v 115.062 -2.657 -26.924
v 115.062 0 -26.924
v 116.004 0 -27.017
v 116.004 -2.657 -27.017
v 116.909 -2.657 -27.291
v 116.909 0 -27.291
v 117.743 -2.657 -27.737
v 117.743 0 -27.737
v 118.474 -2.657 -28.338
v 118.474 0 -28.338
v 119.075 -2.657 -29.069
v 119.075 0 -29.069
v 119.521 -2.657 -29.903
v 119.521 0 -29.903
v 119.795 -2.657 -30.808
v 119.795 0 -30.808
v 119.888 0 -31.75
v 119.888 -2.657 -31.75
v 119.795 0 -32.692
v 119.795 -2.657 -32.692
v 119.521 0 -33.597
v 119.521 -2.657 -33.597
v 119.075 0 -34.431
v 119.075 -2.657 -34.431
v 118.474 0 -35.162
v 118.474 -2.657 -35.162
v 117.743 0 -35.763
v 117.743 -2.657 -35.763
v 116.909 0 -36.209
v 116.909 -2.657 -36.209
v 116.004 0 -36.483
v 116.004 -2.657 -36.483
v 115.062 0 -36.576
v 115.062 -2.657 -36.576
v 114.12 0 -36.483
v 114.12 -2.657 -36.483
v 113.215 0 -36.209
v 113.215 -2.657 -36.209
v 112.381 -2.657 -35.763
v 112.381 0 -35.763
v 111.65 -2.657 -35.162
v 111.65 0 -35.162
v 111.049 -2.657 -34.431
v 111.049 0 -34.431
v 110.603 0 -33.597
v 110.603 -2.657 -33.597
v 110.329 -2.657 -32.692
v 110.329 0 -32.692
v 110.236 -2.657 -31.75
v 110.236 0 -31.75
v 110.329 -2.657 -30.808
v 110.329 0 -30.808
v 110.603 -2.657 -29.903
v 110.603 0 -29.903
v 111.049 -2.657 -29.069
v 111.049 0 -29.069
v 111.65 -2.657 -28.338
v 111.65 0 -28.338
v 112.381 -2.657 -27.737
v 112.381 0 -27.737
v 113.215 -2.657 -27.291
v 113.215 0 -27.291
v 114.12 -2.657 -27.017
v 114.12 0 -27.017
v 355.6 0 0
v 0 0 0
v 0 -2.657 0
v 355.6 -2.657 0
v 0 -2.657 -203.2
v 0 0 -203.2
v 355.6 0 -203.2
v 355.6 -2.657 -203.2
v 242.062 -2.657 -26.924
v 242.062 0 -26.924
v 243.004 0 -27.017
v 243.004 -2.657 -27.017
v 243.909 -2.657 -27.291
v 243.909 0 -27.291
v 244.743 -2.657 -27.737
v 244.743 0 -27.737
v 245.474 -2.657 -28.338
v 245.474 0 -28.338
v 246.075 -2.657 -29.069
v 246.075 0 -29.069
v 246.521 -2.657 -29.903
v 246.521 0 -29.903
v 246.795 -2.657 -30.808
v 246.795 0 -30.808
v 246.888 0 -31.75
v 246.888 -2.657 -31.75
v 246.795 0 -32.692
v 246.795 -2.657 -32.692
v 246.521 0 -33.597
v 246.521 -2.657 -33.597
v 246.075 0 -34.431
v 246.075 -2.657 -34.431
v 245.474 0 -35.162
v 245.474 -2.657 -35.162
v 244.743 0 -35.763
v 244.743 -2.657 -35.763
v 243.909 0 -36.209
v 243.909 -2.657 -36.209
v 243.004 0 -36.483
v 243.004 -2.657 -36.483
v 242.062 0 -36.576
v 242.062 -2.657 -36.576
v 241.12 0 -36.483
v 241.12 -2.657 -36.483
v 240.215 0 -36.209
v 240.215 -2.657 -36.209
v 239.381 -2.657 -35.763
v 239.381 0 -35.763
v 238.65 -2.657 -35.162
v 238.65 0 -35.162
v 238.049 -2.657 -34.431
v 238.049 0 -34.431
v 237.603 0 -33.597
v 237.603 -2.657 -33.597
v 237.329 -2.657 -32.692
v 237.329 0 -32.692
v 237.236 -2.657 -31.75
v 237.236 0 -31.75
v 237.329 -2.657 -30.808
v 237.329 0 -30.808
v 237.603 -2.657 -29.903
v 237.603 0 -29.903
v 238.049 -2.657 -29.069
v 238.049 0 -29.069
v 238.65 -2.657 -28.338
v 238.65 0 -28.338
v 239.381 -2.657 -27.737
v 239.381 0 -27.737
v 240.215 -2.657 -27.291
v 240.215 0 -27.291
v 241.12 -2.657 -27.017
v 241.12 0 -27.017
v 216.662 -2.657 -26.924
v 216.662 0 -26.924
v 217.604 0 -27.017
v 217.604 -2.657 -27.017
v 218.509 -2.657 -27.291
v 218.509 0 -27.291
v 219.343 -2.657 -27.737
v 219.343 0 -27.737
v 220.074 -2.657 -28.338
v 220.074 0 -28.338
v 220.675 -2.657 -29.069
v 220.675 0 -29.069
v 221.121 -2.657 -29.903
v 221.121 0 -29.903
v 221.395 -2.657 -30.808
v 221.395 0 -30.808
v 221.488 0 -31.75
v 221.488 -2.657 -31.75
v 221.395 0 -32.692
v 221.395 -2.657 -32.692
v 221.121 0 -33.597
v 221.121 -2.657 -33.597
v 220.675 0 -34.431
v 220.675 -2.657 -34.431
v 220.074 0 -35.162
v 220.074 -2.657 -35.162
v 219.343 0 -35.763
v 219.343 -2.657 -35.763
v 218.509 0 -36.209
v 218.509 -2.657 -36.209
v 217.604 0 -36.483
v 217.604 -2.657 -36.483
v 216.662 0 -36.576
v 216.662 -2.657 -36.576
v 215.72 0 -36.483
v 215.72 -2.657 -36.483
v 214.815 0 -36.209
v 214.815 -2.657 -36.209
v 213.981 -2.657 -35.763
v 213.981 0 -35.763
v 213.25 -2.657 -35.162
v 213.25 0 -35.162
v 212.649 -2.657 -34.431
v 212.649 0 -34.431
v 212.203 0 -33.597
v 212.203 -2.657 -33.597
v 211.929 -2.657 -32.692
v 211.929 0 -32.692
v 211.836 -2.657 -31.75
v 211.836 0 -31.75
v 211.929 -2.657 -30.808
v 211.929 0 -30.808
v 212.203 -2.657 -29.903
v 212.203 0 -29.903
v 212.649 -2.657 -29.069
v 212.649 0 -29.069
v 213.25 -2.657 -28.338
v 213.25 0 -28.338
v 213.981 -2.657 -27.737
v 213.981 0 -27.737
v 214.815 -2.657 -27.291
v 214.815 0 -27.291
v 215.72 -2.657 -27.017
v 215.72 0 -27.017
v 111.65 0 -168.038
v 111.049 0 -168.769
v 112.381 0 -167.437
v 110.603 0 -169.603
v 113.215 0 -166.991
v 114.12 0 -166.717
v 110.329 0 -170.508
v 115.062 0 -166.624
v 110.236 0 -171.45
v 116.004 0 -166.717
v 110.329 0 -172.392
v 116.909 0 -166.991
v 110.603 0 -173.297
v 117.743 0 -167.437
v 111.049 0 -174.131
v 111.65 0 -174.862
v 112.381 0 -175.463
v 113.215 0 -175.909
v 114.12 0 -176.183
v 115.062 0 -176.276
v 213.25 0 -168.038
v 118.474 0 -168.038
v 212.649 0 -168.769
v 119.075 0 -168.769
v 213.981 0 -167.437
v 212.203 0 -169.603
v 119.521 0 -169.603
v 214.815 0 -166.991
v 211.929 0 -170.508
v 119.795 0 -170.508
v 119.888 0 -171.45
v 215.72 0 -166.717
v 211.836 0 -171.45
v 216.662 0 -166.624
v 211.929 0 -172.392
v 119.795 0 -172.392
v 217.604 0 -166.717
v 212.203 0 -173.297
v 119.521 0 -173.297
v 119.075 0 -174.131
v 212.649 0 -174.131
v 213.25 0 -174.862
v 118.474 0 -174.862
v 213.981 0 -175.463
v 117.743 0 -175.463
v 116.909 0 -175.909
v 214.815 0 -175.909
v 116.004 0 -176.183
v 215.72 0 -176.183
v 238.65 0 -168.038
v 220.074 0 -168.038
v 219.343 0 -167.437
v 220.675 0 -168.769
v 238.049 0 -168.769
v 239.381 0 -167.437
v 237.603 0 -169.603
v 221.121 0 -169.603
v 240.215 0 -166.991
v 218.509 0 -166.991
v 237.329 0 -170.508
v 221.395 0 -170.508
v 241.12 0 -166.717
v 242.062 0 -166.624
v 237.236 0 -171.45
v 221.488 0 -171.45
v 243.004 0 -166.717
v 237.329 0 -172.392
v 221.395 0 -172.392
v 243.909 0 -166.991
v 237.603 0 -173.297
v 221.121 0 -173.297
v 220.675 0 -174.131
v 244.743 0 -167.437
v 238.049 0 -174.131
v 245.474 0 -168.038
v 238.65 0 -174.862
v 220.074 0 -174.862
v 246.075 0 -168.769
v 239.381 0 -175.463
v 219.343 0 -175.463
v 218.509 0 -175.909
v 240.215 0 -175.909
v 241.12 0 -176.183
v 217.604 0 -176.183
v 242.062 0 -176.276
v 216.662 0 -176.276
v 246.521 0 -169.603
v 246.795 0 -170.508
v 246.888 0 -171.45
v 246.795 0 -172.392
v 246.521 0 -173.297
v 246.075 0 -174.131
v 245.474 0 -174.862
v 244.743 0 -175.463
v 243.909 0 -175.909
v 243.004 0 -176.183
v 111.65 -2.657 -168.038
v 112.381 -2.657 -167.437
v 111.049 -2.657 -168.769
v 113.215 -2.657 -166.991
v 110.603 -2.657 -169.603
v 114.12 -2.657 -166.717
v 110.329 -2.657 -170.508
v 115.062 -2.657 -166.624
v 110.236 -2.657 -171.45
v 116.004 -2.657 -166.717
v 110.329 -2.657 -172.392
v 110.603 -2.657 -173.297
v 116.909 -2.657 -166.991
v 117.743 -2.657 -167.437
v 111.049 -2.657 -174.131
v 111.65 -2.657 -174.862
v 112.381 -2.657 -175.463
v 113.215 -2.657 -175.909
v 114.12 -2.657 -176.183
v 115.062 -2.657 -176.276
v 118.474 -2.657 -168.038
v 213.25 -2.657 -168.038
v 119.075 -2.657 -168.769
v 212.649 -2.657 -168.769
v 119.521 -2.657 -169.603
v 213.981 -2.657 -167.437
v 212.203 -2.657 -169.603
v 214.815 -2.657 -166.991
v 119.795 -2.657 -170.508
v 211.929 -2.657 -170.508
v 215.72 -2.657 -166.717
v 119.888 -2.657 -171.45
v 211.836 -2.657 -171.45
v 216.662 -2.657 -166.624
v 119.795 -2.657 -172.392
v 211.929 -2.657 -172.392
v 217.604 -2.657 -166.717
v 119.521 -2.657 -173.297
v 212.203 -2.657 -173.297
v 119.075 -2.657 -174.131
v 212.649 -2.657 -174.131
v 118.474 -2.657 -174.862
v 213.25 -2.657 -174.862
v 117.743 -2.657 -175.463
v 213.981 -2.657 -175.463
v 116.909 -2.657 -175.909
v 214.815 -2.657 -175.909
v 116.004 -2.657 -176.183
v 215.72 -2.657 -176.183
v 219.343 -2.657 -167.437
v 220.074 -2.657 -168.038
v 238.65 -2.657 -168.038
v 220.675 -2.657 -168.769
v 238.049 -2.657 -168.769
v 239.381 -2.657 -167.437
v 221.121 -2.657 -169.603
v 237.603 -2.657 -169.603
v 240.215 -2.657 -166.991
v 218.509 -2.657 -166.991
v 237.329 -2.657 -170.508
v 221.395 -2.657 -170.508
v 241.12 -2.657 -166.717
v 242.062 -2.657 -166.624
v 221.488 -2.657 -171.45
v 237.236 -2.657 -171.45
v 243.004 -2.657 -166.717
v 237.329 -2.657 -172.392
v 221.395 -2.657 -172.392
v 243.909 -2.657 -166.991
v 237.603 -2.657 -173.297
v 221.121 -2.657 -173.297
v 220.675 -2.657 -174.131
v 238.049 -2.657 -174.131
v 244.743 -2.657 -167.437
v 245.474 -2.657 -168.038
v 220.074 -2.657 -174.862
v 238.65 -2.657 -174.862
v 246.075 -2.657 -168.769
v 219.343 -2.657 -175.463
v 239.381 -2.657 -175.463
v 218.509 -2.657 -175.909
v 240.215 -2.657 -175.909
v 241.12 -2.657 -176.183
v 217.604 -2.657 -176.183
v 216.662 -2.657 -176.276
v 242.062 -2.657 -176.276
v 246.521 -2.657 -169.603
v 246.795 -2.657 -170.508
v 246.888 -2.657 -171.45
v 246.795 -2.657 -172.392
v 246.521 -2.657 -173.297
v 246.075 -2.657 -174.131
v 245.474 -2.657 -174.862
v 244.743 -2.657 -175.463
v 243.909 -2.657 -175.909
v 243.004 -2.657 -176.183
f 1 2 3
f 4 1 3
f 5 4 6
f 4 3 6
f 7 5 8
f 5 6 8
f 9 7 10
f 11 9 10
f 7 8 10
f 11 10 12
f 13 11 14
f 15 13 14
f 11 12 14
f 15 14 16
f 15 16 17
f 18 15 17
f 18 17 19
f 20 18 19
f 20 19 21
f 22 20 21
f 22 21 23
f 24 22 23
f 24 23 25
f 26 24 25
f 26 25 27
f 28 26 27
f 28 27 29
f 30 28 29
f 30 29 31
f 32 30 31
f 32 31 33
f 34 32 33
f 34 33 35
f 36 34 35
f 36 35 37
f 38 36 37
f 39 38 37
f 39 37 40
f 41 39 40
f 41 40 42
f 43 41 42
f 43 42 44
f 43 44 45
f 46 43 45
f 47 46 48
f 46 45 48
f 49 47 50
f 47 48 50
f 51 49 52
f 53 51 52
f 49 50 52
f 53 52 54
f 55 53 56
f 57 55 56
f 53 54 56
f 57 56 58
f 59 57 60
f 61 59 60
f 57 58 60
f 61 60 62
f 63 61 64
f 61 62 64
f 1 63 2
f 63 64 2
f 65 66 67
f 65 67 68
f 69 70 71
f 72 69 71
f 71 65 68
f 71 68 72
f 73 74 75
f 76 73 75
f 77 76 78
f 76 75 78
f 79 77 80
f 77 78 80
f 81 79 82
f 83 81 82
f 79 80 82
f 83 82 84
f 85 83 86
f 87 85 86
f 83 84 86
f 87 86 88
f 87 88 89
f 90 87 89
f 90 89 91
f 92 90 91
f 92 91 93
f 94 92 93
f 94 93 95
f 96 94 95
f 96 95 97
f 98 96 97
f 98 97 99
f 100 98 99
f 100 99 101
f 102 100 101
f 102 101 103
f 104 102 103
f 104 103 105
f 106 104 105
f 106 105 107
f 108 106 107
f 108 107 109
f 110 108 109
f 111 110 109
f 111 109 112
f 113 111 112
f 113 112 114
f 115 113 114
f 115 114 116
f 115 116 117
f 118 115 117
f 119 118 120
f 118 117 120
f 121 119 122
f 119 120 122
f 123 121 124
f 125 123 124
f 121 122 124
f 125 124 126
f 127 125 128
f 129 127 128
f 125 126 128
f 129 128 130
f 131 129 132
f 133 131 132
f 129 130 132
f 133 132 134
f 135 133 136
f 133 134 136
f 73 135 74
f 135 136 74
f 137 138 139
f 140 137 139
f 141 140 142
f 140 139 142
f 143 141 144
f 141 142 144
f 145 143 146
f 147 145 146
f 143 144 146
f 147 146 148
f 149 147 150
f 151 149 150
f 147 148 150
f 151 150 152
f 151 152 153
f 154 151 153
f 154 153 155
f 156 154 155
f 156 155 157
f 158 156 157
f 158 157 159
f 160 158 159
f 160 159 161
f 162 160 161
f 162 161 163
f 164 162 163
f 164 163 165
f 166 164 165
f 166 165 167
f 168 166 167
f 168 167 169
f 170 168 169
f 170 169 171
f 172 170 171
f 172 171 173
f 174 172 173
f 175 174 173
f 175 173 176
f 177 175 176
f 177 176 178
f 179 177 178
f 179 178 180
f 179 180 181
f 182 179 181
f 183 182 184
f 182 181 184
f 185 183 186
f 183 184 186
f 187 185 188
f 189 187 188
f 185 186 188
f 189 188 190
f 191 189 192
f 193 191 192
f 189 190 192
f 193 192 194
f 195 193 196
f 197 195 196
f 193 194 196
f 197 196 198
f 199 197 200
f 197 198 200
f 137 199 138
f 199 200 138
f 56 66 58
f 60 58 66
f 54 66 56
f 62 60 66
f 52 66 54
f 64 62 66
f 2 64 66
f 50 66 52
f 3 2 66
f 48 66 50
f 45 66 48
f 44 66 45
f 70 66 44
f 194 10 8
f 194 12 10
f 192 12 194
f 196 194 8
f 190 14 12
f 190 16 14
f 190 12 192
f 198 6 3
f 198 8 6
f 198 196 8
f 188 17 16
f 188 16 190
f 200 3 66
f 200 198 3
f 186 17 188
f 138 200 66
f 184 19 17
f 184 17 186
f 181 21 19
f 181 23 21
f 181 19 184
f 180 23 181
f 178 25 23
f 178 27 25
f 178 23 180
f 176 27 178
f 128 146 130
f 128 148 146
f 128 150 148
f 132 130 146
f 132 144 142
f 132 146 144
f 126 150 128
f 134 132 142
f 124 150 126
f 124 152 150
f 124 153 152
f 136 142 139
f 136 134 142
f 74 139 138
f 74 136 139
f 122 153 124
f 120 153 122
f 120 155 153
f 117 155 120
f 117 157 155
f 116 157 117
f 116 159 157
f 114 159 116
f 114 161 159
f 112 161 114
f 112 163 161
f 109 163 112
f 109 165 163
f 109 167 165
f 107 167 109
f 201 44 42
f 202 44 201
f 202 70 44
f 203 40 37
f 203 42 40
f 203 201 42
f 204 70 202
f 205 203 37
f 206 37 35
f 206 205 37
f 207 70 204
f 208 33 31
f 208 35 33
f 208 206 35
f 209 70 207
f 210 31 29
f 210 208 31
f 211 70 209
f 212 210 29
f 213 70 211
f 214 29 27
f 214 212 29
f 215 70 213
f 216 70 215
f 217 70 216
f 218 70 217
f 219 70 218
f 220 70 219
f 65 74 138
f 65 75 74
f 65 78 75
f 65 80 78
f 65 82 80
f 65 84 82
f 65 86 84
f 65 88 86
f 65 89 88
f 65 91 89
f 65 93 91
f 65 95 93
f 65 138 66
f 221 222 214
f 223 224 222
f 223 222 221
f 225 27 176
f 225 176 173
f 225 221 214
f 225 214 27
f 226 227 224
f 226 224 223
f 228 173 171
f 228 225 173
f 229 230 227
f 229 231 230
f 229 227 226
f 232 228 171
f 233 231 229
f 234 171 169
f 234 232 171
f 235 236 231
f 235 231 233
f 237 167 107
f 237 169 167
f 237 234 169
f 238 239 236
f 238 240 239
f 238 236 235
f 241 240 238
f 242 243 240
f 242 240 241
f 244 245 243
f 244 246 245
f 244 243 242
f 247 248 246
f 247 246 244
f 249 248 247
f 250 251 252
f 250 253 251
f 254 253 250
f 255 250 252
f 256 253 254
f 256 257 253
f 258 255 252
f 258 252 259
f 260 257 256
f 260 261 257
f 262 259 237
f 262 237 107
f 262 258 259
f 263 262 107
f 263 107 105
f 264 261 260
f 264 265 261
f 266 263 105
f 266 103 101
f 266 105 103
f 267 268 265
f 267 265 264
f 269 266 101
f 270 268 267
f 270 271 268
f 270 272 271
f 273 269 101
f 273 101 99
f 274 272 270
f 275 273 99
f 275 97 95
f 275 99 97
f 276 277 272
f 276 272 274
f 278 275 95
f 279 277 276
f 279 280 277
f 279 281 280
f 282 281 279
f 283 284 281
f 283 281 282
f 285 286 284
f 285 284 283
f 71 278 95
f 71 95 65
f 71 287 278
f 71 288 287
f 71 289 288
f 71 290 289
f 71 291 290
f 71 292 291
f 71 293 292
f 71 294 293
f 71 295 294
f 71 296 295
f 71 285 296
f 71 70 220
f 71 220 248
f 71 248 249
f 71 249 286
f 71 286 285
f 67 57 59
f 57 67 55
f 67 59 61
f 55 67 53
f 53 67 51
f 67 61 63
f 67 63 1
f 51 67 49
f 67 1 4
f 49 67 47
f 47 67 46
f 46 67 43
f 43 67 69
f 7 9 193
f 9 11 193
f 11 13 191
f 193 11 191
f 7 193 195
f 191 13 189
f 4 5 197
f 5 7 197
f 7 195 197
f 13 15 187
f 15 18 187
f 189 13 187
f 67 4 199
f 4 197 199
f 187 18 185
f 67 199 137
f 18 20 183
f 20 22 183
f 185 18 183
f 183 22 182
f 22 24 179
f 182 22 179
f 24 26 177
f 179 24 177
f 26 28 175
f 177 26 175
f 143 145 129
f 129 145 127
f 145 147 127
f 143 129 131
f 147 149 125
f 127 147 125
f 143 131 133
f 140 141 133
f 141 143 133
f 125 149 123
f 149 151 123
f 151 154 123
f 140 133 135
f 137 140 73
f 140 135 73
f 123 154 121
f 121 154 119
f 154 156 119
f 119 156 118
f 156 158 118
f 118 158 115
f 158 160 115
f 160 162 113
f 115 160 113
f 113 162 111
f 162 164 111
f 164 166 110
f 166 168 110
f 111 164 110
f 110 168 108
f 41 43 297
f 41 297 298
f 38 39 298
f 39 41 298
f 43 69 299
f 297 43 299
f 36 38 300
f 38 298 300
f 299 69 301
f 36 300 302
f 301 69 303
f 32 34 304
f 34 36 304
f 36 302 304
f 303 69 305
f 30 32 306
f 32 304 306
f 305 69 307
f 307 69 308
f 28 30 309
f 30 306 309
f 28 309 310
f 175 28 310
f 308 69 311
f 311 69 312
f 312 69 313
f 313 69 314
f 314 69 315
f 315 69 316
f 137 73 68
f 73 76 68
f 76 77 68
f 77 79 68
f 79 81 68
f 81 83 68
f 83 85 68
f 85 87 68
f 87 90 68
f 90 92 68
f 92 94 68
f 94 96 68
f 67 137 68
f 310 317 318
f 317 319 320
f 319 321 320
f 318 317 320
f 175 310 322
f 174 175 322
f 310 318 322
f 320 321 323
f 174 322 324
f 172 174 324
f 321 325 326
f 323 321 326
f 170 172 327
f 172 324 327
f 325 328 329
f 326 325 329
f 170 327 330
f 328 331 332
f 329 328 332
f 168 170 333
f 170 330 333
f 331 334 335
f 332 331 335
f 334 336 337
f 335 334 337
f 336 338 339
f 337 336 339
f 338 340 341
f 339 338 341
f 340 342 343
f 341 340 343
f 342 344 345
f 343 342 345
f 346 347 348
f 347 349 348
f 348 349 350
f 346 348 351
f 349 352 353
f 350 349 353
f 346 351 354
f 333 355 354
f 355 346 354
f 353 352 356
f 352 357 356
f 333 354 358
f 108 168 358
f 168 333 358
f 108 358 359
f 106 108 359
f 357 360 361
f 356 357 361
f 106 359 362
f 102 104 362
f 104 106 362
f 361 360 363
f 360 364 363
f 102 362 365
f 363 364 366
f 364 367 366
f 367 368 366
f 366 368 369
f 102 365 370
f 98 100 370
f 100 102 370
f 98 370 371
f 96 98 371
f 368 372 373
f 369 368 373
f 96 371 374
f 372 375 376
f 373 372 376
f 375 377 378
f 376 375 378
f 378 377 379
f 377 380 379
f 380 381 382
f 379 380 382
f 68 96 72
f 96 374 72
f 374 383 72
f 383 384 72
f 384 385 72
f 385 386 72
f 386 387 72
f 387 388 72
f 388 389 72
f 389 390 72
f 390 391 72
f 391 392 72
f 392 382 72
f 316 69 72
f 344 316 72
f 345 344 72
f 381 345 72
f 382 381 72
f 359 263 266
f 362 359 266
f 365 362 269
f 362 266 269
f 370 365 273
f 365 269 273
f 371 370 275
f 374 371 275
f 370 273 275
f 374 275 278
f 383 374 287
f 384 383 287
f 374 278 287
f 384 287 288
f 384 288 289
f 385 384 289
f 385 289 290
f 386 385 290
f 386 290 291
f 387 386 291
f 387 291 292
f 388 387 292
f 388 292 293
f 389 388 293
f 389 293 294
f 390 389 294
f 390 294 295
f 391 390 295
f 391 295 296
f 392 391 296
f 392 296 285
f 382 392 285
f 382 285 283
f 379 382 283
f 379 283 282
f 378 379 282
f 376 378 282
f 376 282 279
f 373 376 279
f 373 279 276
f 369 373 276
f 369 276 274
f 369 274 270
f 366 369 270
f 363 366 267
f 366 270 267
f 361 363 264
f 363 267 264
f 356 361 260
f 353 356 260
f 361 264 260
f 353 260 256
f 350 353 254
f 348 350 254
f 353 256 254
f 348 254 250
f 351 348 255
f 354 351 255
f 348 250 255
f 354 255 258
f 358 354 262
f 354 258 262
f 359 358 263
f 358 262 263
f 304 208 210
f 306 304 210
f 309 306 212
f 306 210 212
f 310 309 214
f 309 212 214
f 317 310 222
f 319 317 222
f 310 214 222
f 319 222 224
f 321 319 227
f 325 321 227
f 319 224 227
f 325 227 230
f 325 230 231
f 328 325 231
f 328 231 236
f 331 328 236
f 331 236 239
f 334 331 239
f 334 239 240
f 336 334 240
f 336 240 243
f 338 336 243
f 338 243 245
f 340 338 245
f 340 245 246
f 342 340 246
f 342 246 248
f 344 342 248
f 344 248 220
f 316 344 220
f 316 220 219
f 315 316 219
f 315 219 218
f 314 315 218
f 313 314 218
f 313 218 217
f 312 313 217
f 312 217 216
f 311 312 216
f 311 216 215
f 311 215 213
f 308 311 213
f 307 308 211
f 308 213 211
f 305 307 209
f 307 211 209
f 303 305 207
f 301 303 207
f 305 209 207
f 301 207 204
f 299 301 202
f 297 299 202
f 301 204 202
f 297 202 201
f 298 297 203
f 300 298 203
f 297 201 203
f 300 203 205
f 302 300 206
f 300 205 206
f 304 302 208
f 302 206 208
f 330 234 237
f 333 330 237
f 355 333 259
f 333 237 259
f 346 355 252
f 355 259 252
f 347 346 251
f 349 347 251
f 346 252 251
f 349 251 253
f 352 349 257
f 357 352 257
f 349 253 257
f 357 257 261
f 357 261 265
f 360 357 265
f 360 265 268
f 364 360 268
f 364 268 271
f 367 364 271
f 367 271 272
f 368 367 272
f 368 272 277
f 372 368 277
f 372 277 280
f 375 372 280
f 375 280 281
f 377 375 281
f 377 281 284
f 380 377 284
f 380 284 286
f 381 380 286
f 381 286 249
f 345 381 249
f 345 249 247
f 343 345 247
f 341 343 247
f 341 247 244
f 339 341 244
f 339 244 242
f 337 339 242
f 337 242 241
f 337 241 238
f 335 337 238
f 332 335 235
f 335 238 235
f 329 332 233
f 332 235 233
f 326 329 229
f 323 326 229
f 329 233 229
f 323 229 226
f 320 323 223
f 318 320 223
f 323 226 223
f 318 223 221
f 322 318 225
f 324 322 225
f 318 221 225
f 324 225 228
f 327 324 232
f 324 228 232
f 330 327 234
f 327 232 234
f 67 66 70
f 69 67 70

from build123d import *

# Parameters (mm, degrees)
SKETCH1_W          = 355.6
SKETCH1_H          = 203.2
BASE_FLANGE1_DEPTH = 2.65684
SKETCH8_R          = 4.826
CUT_EXTRUDE1_DEPTH = 410.571311006


# Sheet-metal steps are written as plain solids
with BuildPart() as part:
    # Sketch1 → Base-Flange1 (new body)
    with BuildSketch(Plane(origin=(0, 0, 0), x_dir=(1, 0, 0), z_dir=(0, 1, 0))):
        with Locations((177.8, 101.6)):
            Rectangle(SKETCH1_W, SKETCH1_H)
    extrude(amount=-BASE_FLANGE1_DEPTH)

    # Sketch8 → Cut-Extrude1 (cut, through all)
    with BuildSketch(Plane(origin=(0, 0, 0), x_dir=(1, 0, 0), z_dir=(0, 1, 0))):
        with Locations(Location((115.062, 171.45, 0), (0, 0, 270))):
            Circle(SKETCH8_R)
        with Locations(Location((216.662, 171.45, 0), (0, 0, 270))):
            Circle(SKETCH8_R)
        with Locations(Location((242.062, 171.45, 0), (0, 0, 270))):
            Circle(SKETCH8_R)
        with Locations(Location((242.062, 31.75, 0), (0, 0, 270))):
            Circle(SKETCH8_R)
        with Locations(Location((216.662, 31.75, 0), (0, 0, 270))):
            Circle(SKETCH8_R)
        with Locations(Location((115.062, 31.75, 0), (0, 0, 270))):
            Circle(SKETCH8_R)
    extrude(amount=-CUT_EXTRUDE1_DEPTH, mode=Mode.SUBTRACT)


solid = part.part
